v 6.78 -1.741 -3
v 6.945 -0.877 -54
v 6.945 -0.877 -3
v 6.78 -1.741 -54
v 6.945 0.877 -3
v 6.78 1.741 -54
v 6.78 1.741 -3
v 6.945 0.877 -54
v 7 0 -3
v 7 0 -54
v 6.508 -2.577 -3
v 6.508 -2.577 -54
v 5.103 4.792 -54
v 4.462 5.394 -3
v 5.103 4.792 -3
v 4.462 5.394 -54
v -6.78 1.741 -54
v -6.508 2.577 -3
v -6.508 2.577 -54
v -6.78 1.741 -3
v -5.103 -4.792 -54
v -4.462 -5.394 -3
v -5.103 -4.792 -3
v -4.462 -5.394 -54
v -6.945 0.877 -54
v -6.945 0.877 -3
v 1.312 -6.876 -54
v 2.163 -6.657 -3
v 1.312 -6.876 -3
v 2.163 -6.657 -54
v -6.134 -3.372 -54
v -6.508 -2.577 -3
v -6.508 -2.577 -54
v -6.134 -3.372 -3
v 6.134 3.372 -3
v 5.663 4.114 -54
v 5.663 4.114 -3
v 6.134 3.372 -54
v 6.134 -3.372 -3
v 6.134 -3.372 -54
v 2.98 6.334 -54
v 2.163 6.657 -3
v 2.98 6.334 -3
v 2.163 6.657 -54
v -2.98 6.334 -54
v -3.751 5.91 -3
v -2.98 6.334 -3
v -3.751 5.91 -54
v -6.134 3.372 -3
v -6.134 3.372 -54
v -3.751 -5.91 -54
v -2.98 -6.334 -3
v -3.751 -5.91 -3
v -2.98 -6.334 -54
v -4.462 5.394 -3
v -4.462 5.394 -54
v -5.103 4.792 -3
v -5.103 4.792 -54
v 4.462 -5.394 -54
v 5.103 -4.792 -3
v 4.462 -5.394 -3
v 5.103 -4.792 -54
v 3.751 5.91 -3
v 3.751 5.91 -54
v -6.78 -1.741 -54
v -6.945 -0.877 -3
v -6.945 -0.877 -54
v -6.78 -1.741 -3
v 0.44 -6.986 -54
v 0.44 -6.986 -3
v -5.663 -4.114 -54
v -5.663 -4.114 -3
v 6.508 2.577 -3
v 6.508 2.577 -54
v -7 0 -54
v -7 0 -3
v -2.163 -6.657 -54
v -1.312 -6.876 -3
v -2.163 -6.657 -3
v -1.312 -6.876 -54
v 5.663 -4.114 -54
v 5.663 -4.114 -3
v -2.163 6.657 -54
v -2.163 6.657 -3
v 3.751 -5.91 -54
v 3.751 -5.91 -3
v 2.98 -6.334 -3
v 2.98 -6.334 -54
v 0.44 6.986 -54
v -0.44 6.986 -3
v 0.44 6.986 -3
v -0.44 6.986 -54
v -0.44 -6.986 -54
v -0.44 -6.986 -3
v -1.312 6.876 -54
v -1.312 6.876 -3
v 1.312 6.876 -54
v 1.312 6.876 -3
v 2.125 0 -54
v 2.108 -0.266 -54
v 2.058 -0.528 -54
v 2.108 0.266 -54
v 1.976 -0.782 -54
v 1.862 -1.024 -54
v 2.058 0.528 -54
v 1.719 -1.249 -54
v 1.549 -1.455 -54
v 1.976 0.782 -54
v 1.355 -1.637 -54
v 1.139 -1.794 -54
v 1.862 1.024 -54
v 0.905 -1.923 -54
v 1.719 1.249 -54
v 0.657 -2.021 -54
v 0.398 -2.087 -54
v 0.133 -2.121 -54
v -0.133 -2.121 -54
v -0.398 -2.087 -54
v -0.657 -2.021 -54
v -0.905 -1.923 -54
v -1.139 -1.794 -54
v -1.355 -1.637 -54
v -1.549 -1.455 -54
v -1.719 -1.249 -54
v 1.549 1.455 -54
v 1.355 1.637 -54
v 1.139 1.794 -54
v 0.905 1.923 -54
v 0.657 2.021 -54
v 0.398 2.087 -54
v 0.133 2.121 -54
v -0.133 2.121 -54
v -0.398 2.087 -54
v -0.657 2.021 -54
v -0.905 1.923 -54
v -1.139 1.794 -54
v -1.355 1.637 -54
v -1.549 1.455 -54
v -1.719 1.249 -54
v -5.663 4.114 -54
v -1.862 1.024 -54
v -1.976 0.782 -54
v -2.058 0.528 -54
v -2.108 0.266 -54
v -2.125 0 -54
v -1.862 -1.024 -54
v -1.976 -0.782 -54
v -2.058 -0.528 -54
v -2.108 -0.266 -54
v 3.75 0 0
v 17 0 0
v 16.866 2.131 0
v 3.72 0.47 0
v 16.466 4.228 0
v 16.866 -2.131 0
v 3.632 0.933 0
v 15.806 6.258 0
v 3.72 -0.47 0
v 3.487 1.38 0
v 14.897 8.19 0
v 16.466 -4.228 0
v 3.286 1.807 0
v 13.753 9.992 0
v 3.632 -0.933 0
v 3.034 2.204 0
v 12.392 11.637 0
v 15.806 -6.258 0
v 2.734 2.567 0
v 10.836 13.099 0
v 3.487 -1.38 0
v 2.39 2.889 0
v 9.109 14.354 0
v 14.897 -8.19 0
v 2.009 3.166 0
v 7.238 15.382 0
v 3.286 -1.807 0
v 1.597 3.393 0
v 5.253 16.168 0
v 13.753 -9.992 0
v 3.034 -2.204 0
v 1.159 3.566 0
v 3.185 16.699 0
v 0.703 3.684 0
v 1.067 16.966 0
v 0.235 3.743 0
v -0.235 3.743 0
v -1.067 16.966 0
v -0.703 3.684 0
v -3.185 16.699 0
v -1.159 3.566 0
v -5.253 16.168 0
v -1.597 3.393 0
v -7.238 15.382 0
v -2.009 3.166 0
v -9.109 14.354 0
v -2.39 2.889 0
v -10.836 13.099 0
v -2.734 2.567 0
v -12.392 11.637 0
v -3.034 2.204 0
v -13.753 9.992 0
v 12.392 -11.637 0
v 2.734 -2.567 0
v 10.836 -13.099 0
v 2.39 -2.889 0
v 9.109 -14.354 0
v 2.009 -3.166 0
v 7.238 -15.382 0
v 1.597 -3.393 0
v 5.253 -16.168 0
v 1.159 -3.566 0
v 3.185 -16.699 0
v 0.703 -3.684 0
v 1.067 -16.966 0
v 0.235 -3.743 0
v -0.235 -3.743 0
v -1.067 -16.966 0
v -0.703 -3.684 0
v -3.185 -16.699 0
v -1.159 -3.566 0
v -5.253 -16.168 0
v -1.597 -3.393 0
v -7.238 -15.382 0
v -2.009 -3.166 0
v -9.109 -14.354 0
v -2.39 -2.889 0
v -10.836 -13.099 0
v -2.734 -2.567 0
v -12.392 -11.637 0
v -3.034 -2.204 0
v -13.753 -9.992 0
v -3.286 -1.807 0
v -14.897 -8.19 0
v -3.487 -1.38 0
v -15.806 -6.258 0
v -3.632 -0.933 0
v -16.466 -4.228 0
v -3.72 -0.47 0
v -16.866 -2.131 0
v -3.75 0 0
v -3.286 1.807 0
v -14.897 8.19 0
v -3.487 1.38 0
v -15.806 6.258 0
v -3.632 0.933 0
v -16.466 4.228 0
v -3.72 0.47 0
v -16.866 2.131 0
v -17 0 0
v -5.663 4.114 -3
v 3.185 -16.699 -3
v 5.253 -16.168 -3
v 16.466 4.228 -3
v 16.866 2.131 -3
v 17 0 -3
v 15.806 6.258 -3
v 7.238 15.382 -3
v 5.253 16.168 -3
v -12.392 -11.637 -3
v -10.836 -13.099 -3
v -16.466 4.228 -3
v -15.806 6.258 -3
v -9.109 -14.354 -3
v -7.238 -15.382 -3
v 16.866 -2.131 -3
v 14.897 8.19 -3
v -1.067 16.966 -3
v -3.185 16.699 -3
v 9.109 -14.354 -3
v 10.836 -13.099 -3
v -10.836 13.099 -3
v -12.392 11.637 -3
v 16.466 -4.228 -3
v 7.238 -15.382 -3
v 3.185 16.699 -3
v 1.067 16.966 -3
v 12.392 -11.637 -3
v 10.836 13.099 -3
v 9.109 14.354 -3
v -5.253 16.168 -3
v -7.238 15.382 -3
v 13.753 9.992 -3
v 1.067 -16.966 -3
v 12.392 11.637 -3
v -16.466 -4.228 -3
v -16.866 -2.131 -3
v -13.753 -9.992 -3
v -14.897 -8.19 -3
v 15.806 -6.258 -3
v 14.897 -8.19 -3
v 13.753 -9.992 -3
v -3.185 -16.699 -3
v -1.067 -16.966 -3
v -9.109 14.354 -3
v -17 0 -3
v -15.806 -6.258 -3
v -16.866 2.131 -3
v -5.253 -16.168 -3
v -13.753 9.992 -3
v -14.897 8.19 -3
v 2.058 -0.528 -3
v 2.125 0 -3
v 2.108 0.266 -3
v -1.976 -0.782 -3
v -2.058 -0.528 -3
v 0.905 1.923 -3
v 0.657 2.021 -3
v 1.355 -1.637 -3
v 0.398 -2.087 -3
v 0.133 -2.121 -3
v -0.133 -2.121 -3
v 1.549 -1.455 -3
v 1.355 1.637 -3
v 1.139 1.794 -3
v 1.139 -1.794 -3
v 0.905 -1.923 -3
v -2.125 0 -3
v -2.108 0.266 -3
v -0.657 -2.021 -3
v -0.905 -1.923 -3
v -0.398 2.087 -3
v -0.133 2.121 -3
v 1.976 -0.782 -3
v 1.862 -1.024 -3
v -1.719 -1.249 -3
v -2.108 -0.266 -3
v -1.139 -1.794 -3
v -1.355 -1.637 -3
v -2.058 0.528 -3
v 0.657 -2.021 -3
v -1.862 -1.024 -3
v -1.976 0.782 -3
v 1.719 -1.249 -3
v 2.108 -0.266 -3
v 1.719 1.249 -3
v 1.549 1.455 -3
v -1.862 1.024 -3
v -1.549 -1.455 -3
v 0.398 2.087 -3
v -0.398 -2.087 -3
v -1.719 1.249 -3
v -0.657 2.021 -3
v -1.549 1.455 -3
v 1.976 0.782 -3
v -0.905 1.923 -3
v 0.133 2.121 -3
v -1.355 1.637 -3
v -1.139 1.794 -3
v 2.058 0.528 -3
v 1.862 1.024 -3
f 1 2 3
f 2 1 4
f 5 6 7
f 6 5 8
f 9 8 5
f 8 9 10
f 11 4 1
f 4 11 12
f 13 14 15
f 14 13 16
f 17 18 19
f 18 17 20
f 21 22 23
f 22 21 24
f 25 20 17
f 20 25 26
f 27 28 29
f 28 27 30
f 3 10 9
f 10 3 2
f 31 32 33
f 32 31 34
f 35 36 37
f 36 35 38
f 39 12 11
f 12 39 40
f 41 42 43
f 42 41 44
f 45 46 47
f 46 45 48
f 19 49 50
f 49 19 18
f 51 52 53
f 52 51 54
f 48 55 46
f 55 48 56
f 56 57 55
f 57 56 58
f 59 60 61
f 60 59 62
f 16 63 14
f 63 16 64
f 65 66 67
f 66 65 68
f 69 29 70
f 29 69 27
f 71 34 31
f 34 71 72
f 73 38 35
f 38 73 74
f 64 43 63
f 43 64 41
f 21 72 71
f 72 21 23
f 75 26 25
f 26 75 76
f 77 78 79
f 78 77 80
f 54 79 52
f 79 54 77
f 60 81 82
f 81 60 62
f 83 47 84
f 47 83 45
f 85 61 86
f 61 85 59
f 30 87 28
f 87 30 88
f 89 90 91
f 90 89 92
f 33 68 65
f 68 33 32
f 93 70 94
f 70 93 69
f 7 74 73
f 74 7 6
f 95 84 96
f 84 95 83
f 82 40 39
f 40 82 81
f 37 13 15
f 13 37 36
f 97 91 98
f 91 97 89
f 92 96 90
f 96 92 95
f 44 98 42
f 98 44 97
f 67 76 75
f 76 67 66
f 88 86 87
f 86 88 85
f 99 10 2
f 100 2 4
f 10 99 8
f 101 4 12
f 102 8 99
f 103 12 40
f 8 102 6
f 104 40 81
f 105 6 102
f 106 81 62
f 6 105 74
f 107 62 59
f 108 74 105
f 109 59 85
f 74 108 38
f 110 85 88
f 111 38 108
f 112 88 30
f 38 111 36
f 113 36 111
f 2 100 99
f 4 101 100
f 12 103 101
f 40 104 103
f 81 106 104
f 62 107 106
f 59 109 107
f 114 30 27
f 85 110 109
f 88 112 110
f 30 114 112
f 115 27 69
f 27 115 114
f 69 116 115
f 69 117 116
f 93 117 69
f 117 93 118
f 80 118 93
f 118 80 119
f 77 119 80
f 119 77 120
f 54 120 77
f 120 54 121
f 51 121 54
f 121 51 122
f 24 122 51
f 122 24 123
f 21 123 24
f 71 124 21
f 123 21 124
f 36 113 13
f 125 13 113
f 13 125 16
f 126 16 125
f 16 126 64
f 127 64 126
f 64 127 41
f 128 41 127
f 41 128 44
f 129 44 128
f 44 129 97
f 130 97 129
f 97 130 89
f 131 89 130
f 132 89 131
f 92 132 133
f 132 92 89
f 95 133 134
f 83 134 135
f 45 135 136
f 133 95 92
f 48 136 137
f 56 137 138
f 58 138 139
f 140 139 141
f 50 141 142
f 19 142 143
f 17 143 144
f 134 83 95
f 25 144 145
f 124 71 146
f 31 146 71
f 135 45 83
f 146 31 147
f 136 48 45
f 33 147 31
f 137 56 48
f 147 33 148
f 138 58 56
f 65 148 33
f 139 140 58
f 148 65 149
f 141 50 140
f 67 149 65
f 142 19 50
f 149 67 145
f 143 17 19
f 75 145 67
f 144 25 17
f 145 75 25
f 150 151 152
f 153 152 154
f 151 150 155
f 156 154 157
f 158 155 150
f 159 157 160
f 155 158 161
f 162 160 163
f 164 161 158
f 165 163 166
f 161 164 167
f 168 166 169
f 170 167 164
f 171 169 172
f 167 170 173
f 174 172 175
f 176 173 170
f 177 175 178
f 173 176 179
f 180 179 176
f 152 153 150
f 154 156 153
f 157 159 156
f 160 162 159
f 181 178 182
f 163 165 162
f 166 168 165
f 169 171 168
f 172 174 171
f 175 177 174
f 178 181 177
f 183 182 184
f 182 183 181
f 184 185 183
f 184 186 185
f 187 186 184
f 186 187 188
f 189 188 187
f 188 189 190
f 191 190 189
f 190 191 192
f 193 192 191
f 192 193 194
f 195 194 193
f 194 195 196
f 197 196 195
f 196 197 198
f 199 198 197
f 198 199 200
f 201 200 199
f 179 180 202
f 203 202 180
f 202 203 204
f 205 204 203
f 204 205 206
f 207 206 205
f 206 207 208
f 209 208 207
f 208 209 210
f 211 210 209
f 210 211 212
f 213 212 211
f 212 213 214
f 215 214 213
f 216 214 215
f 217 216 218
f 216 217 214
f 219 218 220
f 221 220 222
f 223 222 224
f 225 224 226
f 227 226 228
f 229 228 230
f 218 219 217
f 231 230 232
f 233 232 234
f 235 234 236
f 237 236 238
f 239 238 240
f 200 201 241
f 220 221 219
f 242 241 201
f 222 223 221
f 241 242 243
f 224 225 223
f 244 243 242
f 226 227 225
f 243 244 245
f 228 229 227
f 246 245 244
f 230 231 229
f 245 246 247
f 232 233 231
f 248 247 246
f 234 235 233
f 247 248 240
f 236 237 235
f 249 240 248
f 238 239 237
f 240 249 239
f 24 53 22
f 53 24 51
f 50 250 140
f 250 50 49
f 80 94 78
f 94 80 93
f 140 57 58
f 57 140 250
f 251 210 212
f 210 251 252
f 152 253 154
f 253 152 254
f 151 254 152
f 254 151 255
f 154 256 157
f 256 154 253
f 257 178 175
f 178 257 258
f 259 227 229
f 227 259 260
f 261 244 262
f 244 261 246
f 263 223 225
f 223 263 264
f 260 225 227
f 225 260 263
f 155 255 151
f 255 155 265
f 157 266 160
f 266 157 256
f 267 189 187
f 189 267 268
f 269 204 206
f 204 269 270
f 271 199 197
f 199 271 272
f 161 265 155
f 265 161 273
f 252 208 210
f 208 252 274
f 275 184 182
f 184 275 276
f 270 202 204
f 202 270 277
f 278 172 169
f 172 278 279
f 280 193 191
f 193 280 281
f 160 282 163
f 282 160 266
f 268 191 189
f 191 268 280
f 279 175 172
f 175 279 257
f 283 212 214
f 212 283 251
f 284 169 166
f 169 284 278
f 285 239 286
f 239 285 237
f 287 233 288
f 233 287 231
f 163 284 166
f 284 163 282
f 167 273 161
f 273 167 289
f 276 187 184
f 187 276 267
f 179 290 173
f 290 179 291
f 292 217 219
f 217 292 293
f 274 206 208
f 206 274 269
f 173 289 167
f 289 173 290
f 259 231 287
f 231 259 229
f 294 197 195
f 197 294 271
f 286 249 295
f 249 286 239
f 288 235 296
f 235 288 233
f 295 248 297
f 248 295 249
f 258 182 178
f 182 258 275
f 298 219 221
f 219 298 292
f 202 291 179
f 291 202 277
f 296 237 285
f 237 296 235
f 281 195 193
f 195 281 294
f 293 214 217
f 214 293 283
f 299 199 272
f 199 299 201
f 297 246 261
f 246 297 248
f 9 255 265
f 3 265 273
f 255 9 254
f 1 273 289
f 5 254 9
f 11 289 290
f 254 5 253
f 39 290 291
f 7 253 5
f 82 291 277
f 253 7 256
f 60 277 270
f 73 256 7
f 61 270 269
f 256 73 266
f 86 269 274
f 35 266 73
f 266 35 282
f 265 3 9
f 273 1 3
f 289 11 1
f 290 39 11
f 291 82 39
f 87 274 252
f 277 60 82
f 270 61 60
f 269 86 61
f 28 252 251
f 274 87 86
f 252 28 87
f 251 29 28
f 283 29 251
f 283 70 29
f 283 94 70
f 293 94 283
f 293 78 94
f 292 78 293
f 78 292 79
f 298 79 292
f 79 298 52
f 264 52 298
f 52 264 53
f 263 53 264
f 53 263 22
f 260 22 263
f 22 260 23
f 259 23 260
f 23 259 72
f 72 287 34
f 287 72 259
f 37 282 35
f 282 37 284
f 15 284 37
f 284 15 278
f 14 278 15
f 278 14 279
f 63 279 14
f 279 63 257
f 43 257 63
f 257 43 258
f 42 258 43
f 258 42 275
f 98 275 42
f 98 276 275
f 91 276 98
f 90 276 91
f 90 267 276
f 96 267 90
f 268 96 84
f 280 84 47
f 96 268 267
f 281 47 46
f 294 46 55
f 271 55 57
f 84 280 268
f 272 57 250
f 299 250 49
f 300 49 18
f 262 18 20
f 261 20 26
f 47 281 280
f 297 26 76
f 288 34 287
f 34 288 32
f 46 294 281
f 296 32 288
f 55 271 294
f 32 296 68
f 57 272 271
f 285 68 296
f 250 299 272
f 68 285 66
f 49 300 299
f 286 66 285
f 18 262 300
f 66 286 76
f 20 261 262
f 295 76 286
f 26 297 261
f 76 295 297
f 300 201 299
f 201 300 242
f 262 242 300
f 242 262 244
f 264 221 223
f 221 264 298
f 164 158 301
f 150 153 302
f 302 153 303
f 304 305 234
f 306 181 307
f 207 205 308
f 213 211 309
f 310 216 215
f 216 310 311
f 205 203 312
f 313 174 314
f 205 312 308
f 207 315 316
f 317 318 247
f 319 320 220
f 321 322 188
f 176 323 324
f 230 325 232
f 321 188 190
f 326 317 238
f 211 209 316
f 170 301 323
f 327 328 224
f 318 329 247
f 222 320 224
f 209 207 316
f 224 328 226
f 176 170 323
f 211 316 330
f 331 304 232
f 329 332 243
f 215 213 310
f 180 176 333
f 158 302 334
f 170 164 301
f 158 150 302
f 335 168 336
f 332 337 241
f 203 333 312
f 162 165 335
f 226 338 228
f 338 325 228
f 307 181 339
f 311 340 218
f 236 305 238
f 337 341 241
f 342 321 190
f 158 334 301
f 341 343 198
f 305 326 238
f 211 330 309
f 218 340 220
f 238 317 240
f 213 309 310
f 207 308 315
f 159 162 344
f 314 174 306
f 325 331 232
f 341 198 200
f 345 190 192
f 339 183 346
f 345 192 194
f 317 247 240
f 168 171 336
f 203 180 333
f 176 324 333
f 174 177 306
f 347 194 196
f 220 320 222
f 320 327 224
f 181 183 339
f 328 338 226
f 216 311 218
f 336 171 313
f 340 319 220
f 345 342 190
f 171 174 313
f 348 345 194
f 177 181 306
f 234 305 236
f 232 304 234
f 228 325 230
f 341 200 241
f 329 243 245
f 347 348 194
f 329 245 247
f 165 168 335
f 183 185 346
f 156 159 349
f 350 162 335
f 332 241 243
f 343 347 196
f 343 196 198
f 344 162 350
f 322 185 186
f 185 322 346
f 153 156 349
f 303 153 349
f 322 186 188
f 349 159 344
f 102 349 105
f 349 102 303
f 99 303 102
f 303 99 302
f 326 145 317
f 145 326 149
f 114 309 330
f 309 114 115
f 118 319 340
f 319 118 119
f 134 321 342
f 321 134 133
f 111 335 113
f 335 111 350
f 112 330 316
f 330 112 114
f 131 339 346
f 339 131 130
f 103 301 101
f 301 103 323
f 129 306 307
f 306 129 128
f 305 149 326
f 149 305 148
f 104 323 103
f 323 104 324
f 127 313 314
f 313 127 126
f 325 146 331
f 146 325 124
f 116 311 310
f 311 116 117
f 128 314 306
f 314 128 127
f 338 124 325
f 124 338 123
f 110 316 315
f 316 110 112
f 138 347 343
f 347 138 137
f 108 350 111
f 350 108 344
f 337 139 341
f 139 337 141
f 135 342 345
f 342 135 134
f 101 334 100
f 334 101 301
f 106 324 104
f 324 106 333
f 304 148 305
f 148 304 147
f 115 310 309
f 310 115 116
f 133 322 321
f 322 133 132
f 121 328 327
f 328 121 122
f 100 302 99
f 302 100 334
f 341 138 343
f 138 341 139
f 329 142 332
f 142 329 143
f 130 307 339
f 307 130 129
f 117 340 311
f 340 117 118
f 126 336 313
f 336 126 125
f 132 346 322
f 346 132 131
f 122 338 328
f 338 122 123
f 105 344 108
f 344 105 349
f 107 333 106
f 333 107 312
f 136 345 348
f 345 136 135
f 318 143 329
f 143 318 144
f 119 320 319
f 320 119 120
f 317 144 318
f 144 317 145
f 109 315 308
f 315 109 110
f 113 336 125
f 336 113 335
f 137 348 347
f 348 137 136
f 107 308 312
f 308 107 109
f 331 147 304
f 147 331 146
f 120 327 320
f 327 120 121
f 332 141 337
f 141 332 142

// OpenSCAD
$fn = 50;


difference() {
	union() {
		translate(v = [0, 0, -54.0000000000]) {
			cylinder(h = 54, r = 7.0000000000);
		}
		translate(v = [0, 0, -3.0000000000]) {
			cylinder(h = 3, r = 17.0000000000);
		}
	}
	union() {
		translate(v = [0, 0, 0]) {
			rotate(a = [0, 0, 0]) {
				difference() {
					union() {
						#translate(v = [0, 0, -54.0000000000]) {
							cylinder(h = 54, r = 2.0000000000);
						}
						#translate(v = [0, 0, -3]) {
							cylinder(h = 3, r = 7.0000000000, r1 = 2.1250000000, r2 = 3.7500000000);
						}
						#translate(v = [0, 0, -54.0000000000]) {
							cylinder(h = 54, r = 2.1250000000);
						}
						#translate(v = [0, 0, -54.0000000000]) {
							cylinder(h = 54, r = 2.0000000000);
						}
					}
					union();
				}
			}
		}
	}
}
